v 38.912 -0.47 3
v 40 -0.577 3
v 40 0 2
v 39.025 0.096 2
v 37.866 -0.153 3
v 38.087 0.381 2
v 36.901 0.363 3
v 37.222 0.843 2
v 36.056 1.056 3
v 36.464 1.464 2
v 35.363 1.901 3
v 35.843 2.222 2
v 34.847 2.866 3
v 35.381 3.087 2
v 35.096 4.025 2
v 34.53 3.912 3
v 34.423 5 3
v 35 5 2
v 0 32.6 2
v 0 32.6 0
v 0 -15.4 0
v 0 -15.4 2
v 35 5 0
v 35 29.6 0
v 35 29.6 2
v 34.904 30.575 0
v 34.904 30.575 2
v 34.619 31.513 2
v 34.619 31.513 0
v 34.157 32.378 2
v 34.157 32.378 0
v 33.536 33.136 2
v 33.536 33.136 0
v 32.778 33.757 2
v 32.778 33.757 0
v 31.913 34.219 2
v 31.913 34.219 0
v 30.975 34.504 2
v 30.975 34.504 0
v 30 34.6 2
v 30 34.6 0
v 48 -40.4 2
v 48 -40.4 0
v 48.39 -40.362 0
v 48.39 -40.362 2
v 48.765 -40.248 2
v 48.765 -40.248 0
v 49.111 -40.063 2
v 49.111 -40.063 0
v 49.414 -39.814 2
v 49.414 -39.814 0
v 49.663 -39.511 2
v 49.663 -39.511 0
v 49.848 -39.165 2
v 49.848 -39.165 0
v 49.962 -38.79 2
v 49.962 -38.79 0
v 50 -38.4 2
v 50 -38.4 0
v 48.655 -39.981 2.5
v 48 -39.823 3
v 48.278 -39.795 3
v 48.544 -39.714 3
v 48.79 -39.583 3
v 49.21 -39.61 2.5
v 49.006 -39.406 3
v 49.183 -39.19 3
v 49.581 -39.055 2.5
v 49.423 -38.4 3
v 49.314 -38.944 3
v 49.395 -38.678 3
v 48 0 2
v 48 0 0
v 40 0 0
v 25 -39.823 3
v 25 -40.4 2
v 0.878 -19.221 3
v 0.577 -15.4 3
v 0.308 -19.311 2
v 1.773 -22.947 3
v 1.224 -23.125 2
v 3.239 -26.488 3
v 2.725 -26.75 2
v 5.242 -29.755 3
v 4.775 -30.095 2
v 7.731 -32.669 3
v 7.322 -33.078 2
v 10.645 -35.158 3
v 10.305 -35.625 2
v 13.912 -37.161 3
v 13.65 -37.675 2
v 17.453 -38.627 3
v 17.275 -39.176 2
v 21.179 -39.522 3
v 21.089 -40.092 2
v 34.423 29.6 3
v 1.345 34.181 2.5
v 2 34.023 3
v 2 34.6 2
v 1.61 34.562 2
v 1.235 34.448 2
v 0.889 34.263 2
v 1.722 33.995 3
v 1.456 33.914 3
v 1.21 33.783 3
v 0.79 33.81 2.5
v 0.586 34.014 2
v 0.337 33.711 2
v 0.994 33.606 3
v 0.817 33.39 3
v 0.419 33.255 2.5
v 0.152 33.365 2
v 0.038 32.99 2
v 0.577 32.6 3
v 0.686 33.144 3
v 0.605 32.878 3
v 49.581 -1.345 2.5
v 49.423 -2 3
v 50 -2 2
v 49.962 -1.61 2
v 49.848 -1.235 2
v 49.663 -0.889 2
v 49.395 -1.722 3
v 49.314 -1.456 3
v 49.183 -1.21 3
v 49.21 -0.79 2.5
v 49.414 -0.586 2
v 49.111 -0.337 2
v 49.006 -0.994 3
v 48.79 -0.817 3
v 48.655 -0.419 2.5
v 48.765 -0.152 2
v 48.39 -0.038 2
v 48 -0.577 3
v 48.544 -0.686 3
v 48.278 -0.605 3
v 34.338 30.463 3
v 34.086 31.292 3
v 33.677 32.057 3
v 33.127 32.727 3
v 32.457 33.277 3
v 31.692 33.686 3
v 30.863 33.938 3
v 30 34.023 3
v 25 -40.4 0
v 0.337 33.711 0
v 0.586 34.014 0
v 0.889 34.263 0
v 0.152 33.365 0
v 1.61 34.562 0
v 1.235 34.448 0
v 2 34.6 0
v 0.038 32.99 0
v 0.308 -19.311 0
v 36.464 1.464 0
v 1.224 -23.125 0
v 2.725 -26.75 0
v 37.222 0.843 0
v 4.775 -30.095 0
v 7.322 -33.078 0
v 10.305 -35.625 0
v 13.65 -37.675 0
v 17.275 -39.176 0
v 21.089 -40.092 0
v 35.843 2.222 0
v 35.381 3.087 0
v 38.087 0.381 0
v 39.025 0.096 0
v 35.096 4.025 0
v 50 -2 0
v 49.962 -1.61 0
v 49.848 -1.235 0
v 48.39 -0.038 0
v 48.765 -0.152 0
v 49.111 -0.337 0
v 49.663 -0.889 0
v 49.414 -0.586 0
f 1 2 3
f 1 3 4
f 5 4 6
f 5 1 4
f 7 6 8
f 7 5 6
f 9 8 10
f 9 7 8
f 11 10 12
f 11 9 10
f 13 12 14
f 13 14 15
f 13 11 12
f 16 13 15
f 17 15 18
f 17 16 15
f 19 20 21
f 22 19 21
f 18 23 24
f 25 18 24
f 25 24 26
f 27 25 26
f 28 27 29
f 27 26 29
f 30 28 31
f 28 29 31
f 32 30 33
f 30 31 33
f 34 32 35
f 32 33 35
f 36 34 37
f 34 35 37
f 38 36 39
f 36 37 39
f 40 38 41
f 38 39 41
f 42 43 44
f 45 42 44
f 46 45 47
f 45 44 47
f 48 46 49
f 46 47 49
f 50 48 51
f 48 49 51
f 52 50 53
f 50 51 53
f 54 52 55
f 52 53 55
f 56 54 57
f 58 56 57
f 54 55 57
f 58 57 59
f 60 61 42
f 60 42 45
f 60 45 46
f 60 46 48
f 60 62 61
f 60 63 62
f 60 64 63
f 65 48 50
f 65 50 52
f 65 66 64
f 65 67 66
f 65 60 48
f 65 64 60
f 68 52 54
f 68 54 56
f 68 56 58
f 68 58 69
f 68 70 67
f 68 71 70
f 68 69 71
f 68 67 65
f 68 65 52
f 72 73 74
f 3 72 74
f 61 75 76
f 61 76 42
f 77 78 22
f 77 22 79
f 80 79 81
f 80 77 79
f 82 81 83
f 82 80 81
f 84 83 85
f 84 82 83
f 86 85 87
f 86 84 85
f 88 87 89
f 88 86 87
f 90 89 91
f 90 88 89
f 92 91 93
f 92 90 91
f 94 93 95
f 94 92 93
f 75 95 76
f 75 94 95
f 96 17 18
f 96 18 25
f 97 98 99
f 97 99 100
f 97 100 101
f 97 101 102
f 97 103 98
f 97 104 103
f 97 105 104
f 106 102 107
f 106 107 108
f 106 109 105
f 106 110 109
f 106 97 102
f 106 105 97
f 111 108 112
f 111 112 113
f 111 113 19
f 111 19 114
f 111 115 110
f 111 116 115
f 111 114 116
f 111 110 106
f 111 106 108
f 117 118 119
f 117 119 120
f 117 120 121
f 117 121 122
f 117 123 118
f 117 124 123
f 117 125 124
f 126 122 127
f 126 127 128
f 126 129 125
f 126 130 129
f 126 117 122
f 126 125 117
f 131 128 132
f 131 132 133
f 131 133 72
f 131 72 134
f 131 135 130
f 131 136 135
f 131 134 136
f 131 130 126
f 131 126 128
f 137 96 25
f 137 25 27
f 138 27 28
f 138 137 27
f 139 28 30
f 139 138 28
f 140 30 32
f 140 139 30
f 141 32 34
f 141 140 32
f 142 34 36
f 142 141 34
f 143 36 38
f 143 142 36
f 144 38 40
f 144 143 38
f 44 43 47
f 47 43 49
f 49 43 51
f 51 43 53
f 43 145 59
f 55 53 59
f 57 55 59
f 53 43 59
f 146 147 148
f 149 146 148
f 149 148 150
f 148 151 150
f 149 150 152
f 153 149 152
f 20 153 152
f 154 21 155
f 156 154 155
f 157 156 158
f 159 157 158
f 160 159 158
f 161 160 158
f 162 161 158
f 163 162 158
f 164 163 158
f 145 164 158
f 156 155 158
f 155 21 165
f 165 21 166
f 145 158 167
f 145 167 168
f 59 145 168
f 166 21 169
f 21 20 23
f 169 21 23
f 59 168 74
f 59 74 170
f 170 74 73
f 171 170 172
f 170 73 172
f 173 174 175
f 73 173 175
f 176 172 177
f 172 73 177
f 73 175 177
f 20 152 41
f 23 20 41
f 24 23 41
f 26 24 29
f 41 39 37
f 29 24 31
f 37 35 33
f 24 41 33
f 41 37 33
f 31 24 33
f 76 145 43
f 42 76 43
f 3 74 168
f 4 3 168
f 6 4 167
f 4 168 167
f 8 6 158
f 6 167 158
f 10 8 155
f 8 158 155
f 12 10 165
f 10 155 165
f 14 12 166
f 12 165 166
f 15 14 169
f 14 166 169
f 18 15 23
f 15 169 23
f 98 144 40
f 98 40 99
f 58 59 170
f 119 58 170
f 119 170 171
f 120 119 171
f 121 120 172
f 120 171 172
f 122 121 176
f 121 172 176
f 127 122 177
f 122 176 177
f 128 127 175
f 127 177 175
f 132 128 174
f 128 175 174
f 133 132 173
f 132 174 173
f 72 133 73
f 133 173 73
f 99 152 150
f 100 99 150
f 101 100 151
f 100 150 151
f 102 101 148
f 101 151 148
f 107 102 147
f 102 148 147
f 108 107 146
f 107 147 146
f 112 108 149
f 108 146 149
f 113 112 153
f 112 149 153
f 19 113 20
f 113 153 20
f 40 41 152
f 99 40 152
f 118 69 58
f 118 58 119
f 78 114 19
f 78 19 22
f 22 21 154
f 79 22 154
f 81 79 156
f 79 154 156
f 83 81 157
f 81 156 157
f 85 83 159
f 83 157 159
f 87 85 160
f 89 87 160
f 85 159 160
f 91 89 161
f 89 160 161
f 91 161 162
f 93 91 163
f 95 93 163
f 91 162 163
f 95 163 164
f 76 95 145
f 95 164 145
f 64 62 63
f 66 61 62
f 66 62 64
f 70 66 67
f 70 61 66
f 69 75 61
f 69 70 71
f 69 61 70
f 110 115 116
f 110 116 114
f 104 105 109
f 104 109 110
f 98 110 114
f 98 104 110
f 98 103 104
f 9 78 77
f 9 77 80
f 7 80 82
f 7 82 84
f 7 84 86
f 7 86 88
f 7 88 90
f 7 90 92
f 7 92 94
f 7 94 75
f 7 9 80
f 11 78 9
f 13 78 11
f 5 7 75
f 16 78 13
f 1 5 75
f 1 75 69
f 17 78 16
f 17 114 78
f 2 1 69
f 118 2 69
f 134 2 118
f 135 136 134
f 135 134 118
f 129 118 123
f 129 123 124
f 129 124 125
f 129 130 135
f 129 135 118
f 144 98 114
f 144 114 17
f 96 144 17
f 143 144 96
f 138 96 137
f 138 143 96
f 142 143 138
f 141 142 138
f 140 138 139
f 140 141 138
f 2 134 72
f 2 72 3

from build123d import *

# Parameters (mm, degrees)
F1_DEPTH = 3
F2_SIZE2 = 0.57735
F2_SIZE  = 1


with BuildPart() as f1:
    # F0 (on Top) → F1 (new body)
    with BuildSketch(Plane.XY):
        with BuildLine():
            Line((0, 32.6), (0, 0))
            Line((0, 0), (0, -15.4))
            ThreePointArc((0, -15.4), (7.32233, -33.07767), (25, -40.4))
            Line((25, -40.4), (48, -40.4))
            ThreePointArc((48, -40.4), (49.414214, -39.814214), (50, -38.4))
            Line((50, -38.4), (50, -2))
            ThreePointArc((50, -2), (49.414214, -0.585786), (48, 0))
            Line((48, 0), (40, 0))
            ThreePointArc((40, 0), (36.464466, 1.464466), (35, 5))
            Line((35, 5), (35, 29.6))
            ThreePointArc((35, 29.6), (33.535534, 33.135534), (30, 34.6))
            Line((30, 34.6), (2, 34.6))
            ThreePointArc((2, 34.6), (0.585786, 34.014214), (0, 32.6))
        make_face()
    extrude(amount=F1_DEPTH)

    # F2
    f2_edges = [f1.edges().sort_by_distance(p)[0] for p in [
        (0, 8.6, 3),
    ]]
    chamfer(f2_edges, length=F2_SIZE, length2=F2_SIZE2)


solid = f1.part
